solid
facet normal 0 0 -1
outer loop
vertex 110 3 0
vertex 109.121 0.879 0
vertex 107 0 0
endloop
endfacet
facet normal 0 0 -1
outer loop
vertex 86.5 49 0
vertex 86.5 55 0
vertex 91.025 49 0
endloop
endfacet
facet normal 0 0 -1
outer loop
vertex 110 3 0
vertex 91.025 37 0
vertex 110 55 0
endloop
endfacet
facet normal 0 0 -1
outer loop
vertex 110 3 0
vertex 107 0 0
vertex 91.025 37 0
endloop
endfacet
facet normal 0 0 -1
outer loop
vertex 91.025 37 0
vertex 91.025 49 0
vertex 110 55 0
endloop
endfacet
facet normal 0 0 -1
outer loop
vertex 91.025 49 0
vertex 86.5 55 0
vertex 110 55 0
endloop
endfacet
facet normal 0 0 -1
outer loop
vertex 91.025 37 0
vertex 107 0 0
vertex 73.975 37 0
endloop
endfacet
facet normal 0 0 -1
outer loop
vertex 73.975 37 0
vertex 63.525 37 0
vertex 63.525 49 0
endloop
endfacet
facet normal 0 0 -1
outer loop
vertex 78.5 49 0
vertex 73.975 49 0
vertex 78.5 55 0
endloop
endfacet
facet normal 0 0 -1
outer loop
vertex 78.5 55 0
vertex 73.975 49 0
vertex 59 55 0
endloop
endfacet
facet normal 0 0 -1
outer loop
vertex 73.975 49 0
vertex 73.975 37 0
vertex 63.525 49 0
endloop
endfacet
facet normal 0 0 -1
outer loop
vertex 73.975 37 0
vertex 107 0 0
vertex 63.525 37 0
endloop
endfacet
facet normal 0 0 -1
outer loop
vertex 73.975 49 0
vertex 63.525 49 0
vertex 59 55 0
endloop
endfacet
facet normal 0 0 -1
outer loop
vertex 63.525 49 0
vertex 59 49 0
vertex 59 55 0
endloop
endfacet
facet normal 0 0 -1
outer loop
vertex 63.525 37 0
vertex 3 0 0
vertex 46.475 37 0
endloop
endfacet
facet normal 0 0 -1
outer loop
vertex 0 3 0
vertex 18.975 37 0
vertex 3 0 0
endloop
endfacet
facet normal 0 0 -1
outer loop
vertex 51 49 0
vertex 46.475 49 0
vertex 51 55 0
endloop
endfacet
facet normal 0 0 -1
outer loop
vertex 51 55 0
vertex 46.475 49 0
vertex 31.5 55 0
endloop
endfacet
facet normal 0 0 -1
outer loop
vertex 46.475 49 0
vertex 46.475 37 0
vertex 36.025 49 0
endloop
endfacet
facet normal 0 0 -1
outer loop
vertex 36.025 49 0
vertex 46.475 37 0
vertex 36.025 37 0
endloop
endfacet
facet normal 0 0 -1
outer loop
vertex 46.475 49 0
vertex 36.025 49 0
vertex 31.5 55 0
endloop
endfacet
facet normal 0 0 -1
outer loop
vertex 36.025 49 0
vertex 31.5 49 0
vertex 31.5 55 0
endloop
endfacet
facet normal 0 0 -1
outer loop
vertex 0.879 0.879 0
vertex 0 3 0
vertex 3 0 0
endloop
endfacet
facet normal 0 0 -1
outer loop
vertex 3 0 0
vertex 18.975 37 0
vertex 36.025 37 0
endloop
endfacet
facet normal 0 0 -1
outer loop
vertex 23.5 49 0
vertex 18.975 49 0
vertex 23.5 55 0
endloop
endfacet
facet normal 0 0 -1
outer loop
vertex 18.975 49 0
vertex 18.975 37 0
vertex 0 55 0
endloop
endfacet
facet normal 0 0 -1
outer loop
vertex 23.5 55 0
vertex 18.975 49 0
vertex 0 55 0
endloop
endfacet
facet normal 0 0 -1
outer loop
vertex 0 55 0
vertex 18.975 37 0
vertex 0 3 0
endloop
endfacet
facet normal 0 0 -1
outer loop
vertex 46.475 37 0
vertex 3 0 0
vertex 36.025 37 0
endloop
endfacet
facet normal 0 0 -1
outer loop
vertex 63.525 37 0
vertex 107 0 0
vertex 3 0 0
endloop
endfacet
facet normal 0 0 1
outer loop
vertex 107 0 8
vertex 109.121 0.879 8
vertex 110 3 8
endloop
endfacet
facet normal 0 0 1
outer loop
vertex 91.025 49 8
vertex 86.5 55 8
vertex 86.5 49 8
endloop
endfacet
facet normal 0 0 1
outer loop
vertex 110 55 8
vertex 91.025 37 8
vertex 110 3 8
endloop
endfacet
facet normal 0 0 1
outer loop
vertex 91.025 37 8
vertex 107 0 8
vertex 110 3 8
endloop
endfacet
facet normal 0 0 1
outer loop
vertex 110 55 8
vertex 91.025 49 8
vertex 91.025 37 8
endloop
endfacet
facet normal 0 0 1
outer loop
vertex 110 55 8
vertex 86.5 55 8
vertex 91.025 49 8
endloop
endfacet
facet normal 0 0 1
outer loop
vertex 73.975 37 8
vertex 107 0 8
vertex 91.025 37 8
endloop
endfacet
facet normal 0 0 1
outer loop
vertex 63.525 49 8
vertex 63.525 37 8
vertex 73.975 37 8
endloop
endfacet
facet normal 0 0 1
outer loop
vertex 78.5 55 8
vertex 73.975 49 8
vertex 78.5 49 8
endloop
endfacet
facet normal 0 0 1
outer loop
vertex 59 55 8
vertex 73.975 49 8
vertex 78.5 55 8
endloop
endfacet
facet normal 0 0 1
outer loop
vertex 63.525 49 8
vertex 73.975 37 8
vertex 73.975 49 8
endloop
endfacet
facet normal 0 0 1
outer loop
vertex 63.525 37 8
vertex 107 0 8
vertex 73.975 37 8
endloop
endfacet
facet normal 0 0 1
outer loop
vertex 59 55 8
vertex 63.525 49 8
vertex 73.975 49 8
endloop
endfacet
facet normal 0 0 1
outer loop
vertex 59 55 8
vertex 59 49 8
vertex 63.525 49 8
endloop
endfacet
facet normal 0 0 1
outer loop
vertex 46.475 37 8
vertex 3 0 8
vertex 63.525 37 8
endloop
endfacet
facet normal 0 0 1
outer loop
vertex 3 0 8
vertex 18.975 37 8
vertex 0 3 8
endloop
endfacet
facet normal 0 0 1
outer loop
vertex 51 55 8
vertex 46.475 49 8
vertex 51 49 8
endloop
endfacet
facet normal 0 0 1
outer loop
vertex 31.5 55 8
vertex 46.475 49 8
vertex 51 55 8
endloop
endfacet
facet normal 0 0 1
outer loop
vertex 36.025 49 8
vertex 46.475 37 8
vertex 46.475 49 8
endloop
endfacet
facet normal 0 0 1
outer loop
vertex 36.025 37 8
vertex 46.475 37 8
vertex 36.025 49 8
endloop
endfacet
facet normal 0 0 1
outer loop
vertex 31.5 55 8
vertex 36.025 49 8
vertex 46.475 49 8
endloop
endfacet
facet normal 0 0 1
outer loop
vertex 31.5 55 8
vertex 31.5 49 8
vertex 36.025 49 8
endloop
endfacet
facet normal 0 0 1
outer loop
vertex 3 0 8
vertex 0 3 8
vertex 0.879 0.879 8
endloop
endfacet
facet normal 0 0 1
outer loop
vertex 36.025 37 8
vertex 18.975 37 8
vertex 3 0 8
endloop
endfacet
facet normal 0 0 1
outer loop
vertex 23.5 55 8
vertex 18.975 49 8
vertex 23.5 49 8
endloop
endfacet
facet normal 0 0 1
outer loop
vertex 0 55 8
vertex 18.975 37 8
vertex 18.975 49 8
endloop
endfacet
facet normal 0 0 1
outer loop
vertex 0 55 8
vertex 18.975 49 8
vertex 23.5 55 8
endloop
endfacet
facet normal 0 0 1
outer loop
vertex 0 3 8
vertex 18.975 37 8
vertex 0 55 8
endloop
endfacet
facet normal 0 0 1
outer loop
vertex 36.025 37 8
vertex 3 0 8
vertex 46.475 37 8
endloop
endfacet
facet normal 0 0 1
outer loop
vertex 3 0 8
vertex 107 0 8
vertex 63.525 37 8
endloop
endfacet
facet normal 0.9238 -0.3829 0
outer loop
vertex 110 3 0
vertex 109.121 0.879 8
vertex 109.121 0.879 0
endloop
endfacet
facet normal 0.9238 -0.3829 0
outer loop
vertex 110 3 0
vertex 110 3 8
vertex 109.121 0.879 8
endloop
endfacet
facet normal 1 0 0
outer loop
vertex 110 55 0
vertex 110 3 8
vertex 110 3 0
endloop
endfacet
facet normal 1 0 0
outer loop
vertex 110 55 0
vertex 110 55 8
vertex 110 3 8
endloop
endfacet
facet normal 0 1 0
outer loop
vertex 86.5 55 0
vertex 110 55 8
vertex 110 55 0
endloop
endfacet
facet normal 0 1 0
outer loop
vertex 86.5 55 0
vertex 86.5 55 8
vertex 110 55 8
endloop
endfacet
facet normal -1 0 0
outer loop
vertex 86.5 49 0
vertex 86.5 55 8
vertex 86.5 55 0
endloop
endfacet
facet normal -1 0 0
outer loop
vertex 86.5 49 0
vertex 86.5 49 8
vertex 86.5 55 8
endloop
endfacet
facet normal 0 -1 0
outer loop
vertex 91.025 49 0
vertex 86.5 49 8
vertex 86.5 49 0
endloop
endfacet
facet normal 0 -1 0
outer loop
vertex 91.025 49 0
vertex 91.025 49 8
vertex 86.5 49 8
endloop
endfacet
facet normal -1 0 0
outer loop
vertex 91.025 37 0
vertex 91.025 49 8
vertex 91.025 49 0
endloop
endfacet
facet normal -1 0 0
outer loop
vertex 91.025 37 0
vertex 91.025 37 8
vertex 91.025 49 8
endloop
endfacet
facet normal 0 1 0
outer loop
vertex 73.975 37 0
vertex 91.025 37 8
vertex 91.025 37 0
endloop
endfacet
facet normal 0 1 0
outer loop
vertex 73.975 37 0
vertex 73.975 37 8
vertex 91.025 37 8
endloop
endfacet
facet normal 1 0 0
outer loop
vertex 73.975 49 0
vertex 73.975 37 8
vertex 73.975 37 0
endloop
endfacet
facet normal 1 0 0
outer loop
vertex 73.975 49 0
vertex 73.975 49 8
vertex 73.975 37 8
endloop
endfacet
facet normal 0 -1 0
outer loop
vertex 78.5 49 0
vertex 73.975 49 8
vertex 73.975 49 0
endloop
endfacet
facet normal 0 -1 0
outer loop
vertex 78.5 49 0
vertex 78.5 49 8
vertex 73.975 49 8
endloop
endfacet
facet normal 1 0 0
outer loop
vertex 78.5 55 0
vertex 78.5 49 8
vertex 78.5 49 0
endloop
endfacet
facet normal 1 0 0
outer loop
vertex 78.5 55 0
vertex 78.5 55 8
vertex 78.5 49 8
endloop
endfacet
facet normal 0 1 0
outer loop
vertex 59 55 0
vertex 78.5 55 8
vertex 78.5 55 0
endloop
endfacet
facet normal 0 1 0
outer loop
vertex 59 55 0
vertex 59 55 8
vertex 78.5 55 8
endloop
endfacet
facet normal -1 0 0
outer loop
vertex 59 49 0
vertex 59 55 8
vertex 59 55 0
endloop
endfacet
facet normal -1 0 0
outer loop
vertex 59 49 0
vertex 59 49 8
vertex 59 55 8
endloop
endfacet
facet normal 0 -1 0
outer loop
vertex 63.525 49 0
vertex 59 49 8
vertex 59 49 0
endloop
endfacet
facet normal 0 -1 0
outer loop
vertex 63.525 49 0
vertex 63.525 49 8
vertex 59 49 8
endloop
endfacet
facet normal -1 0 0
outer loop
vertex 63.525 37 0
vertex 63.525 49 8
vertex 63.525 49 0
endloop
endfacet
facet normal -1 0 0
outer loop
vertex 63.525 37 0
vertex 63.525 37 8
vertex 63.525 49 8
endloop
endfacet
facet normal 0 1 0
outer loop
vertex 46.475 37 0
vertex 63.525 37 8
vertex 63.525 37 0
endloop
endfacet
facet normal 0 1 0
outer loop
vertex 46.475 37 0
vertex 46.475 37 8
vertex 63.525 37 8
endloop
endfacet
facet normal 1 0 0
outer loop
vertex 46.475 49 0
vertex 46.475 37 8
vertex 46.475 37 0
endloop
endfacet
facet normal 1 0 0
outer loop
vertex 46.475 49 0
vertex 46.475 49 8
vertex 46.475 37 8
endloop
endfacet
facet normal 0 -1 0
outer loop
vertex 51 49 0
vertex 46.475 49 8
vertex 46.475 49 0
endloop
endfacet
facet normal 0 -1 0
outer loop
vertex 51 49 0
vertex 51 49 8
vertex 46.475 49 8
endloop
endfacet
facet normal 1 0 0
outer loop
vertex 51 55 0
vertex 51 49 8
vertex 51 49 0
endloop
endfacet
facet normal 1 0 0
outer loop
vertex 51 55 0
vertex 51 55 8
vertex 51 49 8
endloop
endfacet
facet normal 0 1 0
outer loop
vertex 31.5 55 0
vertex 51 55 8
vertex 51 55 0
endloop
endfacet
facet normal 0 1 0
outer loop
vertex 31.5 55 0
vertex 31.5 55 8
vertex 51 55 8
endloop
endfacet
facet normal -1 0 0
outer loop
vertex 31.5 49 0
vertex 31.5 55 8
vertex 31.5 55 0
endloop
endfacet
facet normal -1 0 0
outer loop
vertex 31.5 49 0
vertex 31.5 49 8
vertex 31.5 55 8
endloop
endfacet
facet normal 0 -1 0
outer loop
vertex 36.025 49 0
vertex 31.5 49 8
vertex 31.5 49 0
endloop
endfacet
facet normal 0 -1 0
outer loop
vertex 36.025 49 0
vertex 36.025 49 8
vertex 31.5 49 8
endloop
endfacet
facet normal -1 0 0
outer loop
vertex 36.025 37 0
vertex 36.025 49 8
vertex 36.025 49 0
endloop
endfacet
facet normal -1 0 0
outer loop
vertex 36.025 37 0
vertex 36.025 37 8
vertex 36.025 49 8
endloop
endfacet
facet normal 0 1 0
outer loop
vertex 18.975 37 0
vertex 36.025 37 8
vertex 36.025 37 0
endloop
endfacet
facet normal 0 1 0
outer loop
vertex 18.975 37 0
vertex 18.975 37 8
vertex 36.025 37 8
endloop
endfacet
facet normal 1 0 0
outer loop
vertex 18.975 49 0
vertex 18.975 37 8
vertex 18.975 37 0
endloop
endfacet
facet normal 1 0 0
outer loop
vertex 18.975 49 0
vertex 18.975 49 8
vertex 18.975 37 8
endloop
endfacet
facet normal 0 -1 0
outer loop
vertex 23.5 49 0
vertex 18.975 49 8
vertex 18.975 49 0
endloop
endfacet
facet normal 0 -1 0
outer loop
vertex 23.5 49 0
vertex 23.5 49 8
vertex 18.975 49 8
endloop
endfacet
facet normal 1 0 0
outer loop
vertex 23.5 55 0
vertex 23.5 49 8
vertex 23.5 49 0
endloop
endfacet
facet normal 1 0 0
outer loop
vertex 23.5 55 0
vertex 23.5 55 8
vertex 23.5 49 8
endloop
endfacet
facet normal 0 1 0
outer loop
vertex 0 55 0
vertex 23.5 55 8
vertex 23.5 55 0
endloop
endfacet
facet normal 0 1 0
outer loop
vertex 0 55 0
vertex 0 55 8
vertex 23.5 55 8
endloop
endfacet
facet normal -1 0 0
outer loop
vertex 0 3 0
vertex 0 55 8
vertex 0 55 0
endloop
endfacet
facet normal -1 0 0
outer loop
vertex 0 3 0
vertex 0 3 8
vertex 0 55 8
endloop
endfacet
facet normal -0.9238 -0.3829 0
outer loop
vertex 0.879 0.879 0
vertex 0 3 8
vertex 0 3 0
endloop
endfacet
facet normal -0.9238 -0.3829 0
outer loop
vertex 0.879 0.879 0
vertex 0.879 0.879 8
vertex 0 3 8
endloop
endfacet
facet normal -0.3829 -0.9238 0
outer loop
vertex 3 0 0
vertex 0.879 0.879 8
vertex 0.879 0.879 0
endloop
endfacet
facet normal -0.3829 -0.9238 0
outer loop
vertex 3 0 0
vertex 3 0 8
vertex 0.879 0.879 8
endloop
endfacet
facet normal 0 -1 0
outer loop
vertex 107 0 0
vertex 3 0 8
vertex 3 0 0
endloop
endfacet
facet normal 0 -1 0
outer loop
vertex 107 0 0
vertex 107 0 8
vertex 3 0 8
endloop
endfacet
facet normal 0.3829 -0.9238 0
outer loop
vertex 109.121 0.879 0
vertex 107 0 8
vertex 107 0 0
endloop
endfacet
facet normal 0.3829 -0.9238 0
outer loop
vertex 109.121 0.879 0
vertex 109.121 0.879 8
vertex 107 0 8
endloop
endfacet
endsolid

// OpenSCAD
$fn = 32;

// ----------------------------------------------------------------------
// Window plate: 110 x 55 mm, 3 open windows
// ----------------------------------------------------------------------

// --- parameters (mm) ---
profile_height = 8;       // extrusion height
profile_points = 32;      // points of the closed outline

profile = [[0, 3], [0.879, 0.879], [3, 0], [107, 0], [109.121, 0.879], [110, 3], [110, 55], [86.5, 55], [86.5, 49], [91.025, 49], [91.025, 37], [73.975, 37], [73.975, 49], [78.5, 49], [78.5, 55], [59, 55], [59, 49], [63.525, 49], [63.525, 37], [46.475, 37], [46.475, 49], [51, 49], [51, 55], [31.5, 55], [31.5, 49], [36.025, 49], [36.025, 37], [18.975, 37], [18.975, 49], [23.5, 49], [23.5, 55], [0, 55]];  // single closed polygon, 32 points, counter clockwise

// --- the one profile operation ---
linear_extrude(height = profile_height) polygon(points = profile);
